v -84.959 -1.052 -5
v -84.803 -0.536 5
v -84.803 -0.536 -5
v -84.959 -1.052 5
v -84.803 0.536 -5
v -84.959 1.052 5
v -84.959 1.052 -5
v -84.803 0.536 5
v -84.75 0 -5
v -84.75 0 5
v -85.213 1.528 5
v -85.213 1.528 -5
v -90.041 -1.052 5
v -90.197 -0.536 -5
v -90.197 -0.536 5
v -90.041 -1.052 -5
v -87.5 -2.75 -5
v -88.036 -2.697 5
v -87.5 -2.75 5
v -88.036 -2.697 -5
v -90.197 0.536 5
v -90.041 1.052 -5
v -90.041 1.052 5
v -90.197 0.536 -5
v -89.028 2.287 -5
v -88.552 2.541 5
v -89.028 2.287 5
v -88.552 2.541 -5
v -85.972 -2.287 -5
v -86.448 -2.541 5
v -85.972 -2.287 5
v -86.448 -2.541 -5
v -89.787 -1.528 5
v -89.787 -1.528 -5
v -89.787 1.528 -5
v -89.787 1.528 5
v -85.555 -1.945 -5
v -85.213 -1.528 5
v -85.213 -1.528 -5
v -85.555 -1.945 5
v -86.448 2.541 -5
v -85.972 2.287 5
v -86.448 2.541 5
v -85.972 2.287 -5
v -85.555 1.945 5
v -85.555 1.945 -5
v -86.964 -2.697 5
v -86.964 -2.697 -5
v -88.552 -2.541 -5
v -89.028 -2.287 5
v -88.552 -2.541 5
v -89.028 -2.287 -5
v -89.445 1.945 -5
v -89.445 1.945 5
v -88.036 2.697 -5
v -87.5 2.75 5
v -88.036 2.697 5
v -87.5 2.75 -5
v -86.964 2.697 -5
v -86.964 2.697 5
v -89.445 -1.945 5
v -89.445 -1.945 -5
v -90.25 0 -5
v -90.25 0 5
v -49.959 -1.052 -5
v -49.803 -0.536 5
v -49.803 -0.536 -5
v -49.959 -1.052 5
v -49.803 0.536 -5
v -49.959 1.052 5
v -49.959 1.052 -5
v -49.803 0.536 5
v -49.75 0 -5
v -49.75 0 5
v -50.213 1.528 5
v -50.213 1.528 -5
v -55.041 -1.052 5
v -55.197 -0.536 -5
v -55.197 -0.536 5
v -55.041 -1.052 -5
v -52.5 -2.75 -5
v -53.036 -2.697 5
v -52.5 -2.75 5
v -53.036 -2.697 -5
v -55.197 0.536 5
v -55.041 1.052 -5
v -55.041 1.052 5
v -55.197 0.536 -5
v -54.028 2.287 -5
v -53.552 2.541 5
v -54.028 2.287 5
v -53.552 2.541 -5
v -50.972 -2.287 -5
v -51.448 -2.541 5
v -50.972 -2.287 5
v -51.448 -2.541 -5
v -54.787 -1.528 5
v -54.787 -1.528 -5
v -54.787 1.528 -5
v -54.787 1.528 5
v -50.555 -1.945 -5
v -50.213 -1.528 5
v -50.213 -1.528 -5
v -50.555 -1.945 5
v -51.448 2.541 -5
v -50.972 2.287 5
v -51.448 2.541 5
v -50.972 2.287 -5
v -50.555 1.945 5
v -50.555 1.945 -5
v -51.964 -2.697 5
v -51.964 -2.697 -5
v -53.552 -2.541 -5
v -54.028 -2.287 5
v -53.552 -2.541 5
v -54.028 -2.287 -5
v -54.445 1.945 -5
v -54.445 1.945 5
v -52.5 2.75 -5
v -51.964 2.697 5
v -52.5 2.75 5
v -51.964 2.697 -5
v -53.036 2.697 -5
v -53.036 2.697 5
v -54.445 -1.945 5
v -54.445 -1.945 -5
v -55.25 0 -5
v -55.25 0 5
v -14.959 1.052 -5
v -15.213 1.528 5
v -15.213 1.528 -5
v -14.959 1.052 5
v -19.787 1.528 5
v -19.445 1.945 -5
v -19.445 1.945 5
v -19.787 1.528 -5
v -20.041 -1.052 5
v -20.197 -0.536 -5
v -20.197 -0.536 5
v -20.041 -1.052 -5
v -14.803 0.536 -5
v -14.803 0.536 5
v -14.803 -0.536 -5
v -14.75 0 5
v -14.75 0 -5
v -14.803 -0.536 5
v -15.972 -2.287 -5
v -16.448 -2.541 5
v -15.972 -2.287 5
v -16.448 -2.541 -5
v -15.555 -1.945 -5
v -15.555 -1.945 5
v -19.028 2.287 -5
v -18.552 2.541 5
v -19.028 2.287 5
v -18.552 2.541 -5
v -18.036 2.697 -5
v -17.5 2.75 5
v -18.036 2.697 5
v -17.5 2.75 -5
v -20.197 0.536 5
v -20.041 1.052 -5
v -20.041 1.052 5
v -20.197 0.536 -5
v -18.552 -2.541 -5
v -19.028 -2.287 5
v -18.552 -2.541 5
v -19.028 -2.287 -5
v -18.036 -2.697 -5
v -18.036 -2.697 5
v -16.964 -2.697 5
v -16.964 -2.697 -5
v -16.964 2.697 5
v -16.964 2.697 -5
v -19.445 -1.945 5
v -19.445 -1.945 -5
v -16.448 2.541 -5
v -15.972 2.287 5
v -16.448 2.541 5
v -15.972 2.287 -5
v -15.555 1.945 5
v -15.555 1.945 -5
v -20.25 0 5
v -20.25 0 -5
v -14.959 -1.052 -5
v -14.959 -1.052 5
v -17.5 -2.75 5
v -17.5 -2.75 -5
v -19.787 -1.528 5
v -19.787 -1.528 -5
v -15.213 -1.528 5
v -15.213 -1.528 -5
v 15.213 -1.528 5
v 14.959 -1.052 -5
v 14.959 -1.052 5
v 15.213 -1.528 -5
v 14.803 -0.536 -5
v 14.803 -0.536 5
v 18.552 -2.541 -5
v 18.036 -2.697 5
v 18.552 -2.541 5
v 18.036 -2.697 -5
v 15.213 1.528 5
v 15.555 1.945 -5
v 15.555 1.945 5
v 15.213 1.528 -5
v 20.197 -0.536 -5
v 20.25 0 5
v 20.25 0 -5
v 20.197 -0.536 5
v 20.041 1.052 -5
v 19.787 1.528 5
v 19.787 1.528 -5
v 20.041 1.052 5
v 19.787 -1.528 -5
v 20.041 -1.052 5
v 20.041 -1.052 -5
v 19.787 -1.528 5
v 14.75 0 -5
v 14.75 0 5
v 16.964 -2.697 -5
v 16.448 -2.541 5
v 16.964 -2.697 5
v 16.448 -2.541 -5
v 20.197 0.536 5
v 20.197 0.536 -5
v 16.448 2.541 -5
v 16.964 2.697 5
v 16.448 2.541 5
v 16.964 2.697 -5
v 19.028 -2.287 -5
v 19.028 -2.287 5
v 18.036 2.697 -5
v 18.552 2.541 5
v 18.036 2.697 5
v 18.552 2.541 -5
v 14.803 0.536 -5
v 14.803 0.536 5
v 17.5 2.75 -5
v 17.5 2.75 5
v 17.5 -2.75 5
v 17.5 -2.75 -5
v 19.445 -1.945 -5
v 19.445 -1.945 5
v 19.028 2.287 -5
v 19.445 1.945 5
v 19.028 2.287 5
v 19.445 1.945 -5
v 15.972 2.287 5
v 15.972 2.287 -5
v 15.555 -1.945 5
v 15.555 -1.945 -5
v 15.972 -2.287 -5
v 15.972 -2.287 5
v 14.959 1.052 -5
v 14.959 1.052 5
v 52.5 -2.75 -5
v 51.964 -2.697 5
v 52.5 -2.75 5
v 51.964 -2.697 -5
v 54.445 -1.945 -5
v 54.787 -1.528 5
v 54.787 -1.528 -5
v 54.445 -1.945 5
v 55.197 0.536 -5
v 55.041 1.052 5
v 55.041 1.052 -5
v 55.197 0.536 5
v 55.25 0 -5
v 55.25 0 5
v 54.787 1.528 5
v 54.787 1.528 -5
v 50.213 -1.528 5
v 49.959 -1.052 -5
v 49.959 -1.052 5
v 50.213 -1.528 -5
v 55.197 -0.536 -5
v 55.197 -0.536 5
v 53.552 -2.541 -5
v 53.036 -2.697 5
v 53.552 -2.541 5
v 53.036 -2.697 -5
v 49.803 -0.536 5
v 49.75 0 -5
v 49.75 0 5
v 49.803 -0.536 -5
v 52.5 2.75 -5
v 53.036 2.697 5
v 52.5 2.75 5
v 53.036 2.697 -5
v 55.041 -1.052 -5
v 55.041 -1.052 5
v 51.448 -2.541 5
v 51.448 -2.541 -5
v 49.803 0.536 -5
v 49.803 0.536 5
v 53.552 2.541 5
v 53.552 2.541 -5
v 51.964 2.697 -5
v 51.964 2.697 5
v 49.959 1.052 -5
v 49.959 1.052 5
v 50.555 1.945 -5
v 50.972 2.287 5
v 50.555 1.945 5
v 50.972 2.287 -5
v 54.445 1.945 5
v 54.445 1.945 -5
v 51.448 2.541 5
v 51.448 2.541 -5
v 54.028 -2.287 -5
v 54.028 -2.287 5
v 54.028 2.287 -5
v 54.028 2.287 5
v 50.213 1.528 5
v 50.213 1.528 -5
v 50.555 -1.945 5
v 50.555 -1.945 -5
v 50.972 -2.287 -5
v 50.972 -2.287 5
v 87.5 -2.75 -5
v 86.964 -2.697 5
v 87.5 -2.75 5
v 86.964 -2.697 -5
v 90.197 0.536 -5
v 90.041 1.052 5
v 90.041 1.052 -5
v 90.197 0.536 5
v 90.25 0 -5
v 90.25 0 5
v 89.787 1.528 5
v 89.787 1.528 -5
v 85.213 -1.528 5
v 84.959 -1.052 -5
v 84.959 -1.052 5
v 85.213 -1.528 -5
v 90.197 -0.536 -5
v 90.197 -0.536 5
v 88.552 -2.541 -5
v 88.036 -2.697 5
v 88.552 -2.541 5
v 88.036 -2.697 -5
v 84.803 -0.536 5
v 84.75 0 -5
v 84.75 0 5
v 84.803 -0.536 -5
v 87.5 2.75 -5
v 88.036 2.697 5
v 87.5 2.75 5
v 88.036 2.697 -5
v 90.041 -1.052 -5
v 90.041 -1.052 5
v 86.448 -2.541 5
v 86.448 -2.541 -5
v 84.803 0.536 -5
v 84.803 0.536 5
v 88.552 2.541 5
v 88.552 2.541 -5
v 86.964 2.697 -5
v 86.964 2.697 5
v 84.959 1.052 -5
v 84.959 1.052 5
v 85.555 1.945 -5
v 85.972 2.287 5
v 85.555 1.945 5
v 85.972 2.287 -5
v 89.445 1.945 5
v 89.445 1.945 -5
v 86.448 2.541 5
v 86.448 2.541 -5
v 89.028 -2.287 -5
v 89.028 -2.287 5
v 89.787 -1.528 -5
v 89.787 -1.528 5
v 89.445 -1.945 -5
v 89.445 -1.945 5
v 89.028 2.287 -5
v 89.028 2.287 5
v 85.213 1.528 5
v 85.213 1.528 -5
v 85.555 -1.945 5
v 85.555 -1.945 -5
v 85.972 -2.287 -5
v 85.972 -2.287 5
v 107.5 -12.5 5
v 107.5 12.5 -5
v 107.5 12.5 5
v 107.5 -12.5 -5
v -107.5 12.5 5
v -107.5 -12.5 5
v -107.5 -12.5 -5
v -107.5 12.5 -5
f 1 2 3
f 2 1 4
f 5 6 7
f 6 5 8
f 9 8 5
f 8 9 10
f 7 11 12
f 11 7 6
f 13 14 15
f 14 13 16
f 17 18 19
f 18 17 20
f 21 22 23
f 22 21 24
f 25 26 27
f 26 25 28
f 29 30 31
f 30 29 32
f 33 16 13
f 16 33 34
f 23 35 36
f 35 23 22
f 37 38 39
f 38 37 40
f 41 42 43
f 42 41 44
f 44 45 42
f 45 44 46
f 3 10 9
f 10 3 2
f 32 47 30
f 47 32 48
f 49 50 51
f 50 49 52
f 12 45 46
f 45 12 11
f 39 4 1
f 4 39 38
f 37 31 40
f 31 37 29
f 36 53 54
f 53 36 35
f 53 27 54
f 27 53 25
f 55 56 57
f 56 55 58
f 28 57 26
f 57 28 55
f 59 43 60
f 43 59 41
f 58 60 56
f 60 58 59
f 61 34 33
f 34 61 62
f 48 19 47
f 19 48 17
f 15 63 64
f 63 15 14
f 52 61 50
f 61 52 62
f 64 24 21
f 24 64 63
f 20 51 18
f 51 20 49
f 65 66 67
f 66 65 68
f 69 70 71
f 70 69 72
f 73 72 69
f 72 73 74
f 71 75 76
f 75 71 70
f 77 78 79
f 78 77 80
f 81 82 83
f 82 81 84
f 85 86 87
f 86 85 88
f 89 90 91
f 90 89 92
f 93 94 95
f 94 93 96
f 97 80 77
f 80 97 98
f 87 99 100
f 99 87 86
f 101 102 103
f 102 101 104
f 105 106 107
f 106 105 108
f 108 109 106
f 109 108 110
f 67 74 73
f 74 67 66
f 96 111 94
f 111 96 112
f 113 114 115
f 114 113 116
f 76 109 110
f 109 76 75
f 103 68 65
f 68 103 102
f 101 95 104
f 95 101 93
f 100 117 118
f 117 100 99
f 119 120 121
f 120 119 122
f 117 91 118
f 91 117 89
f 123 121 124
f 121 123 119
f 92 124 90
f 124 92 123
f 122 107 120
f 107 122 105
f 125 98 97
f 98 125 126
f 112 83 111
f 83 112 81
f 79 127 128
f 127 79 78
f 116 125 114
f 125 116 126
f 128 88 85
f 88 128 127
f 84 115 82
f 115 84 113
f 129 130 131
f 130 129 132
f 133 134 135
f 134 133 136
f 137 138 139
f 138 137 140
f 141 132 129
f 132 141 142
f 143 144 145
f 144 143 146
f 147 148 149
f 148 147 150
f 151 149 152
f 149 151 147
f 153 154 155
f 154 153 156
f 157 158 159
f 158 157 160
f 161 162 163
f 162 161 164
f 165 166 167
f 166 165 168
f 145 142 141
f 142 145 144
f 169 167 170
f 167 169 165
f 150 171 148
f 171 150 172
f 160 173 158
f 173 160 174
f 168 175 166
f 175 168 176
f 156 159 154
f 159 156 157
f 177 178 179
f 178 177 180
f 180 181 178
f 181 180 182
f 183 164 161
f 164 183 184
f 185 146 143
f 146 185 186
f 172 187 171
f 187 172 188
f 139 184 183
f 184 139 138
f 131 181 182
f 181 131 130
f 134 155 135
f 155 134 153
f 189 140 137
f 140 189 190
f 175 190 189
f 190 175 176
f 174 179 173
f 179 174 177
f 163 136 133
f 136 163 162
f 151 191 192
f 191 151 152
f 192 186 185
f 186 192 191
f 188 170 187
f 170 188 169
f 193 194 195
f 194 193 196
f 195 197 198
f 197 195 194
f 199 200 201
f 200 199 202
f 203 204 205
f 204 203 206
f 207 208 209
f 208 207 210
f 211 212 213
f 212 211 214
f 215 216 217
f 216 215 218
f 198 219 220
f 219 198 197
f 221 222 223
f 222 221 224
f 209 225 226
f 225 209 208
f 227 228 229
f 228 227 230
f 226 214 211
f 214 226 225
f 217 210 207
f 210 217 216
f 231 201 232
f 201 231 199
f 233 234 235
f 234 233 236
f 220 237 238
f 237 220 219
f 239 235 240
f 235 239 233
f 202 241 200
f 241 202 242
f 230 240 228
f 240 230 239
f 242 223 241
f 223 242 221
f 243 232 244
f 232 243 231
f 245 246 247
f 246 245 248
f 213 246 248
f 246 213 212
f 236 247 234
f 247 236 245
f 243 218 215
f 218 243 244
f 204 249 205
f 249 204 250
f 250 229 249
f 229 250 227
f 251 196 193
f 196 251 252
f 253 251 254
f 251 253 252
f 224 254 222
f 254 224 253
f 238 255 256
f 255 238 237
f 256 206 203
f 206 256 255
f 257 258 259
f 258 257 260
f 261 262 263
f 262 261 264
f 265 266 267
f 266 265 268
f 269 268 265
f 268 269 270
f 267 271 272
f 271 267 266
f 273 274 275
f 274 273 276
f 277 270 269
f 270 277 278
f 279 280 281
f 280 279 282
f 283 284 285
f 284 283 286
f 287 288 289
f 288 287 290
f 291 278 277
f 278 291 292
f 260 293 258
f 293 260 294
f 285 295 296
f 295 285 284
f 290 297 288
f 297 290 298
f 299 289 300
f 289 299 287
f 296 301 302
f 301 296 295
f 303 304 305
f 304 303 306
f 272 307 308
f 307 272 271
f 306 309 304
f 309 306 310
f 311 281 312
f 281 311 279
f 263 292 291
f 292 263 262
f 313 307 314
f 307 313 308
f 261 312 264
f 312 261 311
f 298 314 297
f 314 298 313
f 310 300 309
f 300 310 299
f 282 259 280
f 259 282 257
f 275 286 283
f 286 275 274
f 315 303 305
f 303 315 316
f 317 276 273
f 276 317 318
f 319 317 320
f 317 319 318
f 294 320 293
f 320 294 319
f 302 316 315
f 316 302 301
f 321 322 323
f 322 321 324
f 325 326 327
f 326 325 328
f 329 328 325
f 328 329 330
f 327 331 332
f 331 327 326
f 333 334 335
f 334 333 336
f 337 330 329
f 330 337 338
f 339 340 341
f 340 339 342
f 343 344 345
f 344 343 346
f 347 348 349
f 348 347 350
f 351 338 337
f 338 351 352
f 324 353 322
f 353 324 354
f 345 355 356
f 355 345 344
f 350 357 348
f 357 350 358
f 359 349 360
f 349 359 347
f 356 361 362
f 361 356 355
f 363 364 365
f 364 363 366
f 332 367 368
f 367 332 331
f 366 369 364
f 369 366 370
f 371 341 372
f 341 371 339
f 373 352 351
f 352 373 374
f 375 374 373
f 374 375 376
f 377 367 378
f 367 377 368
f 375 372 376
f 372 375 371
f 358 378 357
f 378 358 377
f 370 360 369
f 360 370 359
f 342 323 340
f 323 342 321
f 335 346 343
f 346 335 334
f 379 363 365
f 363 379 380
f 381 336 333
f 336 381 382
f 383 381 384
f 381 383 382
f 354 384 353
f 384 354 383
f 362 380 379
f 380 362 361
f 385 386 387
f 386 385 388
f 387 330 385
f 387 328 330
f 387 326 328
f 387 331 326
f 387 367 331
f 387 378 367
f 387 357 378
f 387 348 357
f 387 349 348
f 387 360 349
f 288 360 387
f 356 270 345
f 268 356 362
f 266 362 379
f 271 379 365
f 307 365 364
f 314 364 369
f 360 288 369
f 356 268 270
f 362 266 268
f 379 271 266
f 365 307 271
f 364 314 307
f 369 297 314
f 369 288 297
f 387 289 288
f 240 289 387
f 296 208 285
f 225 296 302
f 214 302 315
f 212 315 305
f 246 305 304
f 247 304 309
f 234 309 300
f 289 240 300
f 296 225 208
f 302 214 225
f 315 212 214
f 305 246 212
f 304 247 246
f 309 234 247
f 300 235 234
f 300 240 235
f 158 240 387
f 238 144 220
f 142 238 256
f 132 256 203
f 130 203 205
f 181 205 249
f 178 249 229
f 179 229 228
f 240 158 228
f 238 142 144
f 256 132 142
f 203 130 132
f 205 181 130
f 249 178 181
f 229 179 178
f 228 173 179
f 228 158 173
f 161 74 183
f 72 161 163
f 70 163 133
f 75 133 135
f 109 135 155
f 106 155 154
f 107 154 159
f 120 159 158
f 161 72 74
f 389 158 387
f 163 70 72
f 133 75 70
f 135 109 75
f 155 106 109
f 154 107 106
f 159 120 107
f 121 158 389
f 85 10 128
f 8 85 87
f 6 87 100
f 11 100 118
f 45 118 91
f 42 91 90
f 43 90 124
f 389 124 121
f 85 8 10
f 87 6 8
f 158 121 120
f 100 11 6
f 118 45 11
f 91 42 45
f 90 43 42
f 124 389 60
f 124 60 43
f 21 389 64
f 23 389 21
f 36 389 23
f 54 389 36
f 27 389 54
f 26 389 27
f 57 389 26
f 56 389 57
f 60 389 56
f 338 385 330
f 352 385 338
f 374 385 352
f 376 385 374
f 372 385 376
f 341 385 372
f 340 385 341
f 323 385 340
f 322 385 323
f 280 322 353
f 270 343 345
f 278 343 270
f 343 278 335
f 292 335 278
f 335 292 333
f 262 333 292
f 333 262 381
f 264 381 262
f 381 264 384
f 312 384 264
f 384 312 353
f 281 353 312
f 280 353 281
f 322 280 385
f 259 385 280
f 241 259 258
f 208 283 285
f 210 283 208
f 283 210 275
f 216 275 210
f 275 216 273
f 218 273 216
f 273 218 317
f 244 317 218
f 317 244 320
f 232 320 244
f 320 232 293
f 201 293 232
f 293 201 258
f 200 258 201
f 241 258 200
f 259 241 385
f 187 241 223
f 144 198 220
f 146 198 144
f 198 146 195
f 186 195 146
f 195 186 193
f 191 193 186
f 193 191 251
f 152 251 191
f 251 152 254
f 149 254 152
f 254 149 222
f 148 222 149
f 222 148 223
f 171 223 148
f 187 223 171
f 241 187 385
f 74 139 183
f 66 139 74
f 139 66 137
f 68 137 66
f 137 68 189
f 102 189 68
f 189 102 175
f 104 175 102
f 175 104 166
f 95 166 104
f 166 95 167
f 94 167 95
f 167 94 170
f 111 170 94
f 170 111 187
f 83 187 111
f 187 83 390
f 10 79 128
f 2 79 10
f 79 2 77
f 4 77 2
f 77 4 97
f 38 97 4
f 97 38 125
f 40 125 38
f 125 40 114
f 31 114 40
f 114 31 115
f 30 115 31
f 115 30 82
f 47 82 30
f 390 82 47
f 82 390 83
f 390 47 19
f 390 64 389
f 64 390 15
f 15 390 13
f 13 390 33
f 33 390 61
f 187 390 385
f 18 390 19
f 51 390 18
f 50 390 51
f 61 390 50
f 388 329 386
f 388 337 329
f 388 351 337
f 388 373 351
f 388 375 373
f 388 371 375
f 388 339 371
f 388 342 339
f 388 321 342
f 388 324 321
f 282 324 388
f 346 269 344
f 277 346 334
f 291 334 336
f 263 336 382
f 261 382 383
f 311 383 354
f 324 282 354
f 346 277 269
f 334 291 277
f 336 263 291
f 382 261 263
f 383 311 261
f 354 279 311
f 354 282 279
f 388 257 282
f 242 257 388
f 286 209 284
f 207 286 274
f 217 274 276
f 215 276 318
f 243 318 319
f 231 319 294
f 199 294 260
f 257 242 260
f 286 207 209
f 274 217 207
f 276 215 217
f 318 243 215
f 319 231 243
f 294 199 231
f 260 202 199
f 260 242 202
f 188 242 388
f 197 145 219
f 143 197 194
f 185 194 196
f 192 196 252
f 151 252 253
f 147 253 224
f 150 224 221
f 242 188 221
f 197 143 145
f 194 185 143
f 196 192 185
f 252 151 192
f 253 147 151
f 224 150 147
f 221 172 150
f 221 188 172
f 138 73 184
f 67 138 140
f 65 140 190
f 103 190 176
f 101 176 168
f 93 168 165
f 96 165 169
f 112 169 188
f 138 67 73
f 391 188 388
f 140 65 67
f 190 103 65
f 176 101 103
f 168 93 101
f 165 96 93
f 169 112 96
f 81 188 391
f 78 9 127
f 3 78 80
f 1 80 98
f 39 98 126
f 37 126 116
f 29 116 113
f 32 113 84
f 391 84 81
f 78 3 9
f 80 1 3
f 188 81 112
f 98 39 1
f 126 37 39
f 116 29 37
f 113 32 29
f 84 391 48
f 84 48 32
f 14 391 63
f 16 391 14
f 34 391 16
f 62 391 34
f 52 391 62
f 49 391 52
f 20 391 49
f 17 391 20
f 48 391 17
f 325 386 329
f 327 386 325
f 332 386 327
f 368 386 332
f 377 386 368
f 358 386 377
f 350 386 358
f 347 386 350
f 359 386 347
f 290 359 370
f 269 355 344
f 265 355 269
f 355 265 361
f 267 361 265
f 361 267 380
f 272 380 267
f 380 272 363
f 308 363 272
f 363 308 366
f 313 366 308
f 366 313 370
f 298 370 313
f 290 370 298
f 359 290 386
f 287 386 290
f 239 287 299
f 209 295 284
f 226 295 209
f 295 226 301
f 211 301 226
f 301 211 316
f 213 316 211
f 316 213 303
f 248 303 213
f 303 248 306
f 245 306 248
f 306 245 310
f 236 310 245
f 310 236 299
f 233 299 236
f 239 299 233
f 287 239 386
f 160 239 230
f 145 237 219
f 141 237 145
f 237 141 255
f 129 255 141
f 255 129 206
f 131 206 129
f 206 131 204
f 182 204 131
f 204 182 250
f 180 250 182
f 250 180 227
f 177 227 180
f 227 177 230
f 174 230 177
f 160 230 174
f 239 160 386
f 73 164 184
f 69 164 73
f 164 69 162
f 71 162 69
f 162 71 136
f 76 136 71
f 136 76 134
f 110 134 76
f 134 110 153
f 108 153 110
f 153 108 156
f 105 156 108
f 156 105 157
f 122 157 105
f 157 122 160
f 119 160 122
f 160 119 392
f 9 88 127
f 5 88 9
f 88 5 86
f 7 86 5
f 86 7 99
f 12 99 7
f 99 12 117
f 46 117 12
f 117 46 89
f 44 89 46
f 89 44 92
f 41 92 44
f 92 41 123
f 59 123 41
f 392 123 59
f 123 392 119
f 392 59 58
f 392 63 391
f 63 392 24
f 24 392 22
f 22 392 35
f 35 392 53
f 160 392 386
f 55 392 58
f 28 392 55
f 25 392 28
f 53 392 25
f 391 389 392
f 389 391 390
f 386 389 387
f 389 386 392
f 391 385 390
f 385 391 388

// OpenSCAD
$fn = 32;

// ----------------------------------------------------------------------
// Hole bar, 6 x Ø5.5
// row layout, 20 mm edge offset
// ----------------------------------------------------------------------

// --- parameters (mm) ---
bar_w = 25;    // bar width (Y)
bar_t = 10;    // bar thickness (Z)
holes = 6;     // holes per row
hole_d = 5.5;  // hole diameter
edge = 20;     // offset from the bar end to the first hole
pitch = 35;    // pitch between neighbouring holes

// --- derived feature positions (mm) ---
span = (holes - 1) * pitch;   // = 175   distance between the end holes
bar_l = span + 2 * edge;      // = 215   overall bar length
start_x = -bar_l / 2 + edge;  // = -87.5   X of the first hole
feature_centers = [
  [start_x + 0 * pitch, 0],
  [start_x + 1 * pitch, 0],
  [start_x + 2 * pitch, 0],
  [start_x + 3 * pitch, 0],
  [start_x + 4 * pitch, 0],
  [start_x + 5 * pitch, 0]
];   // hole centres of the first row

// bar with one row of holes, drilled from feature_centers
difference() {
  translate([-bar_l / 2, -bar_w / 2, -bar_t / 2]) cube([bar_l, bar_w, bar_t]);
  for (centre = feature_centers)
    translate([centre[0], centre[1], 0])
      cylinder(d = hole_d, h = bar_t + 2, center = true);
}
